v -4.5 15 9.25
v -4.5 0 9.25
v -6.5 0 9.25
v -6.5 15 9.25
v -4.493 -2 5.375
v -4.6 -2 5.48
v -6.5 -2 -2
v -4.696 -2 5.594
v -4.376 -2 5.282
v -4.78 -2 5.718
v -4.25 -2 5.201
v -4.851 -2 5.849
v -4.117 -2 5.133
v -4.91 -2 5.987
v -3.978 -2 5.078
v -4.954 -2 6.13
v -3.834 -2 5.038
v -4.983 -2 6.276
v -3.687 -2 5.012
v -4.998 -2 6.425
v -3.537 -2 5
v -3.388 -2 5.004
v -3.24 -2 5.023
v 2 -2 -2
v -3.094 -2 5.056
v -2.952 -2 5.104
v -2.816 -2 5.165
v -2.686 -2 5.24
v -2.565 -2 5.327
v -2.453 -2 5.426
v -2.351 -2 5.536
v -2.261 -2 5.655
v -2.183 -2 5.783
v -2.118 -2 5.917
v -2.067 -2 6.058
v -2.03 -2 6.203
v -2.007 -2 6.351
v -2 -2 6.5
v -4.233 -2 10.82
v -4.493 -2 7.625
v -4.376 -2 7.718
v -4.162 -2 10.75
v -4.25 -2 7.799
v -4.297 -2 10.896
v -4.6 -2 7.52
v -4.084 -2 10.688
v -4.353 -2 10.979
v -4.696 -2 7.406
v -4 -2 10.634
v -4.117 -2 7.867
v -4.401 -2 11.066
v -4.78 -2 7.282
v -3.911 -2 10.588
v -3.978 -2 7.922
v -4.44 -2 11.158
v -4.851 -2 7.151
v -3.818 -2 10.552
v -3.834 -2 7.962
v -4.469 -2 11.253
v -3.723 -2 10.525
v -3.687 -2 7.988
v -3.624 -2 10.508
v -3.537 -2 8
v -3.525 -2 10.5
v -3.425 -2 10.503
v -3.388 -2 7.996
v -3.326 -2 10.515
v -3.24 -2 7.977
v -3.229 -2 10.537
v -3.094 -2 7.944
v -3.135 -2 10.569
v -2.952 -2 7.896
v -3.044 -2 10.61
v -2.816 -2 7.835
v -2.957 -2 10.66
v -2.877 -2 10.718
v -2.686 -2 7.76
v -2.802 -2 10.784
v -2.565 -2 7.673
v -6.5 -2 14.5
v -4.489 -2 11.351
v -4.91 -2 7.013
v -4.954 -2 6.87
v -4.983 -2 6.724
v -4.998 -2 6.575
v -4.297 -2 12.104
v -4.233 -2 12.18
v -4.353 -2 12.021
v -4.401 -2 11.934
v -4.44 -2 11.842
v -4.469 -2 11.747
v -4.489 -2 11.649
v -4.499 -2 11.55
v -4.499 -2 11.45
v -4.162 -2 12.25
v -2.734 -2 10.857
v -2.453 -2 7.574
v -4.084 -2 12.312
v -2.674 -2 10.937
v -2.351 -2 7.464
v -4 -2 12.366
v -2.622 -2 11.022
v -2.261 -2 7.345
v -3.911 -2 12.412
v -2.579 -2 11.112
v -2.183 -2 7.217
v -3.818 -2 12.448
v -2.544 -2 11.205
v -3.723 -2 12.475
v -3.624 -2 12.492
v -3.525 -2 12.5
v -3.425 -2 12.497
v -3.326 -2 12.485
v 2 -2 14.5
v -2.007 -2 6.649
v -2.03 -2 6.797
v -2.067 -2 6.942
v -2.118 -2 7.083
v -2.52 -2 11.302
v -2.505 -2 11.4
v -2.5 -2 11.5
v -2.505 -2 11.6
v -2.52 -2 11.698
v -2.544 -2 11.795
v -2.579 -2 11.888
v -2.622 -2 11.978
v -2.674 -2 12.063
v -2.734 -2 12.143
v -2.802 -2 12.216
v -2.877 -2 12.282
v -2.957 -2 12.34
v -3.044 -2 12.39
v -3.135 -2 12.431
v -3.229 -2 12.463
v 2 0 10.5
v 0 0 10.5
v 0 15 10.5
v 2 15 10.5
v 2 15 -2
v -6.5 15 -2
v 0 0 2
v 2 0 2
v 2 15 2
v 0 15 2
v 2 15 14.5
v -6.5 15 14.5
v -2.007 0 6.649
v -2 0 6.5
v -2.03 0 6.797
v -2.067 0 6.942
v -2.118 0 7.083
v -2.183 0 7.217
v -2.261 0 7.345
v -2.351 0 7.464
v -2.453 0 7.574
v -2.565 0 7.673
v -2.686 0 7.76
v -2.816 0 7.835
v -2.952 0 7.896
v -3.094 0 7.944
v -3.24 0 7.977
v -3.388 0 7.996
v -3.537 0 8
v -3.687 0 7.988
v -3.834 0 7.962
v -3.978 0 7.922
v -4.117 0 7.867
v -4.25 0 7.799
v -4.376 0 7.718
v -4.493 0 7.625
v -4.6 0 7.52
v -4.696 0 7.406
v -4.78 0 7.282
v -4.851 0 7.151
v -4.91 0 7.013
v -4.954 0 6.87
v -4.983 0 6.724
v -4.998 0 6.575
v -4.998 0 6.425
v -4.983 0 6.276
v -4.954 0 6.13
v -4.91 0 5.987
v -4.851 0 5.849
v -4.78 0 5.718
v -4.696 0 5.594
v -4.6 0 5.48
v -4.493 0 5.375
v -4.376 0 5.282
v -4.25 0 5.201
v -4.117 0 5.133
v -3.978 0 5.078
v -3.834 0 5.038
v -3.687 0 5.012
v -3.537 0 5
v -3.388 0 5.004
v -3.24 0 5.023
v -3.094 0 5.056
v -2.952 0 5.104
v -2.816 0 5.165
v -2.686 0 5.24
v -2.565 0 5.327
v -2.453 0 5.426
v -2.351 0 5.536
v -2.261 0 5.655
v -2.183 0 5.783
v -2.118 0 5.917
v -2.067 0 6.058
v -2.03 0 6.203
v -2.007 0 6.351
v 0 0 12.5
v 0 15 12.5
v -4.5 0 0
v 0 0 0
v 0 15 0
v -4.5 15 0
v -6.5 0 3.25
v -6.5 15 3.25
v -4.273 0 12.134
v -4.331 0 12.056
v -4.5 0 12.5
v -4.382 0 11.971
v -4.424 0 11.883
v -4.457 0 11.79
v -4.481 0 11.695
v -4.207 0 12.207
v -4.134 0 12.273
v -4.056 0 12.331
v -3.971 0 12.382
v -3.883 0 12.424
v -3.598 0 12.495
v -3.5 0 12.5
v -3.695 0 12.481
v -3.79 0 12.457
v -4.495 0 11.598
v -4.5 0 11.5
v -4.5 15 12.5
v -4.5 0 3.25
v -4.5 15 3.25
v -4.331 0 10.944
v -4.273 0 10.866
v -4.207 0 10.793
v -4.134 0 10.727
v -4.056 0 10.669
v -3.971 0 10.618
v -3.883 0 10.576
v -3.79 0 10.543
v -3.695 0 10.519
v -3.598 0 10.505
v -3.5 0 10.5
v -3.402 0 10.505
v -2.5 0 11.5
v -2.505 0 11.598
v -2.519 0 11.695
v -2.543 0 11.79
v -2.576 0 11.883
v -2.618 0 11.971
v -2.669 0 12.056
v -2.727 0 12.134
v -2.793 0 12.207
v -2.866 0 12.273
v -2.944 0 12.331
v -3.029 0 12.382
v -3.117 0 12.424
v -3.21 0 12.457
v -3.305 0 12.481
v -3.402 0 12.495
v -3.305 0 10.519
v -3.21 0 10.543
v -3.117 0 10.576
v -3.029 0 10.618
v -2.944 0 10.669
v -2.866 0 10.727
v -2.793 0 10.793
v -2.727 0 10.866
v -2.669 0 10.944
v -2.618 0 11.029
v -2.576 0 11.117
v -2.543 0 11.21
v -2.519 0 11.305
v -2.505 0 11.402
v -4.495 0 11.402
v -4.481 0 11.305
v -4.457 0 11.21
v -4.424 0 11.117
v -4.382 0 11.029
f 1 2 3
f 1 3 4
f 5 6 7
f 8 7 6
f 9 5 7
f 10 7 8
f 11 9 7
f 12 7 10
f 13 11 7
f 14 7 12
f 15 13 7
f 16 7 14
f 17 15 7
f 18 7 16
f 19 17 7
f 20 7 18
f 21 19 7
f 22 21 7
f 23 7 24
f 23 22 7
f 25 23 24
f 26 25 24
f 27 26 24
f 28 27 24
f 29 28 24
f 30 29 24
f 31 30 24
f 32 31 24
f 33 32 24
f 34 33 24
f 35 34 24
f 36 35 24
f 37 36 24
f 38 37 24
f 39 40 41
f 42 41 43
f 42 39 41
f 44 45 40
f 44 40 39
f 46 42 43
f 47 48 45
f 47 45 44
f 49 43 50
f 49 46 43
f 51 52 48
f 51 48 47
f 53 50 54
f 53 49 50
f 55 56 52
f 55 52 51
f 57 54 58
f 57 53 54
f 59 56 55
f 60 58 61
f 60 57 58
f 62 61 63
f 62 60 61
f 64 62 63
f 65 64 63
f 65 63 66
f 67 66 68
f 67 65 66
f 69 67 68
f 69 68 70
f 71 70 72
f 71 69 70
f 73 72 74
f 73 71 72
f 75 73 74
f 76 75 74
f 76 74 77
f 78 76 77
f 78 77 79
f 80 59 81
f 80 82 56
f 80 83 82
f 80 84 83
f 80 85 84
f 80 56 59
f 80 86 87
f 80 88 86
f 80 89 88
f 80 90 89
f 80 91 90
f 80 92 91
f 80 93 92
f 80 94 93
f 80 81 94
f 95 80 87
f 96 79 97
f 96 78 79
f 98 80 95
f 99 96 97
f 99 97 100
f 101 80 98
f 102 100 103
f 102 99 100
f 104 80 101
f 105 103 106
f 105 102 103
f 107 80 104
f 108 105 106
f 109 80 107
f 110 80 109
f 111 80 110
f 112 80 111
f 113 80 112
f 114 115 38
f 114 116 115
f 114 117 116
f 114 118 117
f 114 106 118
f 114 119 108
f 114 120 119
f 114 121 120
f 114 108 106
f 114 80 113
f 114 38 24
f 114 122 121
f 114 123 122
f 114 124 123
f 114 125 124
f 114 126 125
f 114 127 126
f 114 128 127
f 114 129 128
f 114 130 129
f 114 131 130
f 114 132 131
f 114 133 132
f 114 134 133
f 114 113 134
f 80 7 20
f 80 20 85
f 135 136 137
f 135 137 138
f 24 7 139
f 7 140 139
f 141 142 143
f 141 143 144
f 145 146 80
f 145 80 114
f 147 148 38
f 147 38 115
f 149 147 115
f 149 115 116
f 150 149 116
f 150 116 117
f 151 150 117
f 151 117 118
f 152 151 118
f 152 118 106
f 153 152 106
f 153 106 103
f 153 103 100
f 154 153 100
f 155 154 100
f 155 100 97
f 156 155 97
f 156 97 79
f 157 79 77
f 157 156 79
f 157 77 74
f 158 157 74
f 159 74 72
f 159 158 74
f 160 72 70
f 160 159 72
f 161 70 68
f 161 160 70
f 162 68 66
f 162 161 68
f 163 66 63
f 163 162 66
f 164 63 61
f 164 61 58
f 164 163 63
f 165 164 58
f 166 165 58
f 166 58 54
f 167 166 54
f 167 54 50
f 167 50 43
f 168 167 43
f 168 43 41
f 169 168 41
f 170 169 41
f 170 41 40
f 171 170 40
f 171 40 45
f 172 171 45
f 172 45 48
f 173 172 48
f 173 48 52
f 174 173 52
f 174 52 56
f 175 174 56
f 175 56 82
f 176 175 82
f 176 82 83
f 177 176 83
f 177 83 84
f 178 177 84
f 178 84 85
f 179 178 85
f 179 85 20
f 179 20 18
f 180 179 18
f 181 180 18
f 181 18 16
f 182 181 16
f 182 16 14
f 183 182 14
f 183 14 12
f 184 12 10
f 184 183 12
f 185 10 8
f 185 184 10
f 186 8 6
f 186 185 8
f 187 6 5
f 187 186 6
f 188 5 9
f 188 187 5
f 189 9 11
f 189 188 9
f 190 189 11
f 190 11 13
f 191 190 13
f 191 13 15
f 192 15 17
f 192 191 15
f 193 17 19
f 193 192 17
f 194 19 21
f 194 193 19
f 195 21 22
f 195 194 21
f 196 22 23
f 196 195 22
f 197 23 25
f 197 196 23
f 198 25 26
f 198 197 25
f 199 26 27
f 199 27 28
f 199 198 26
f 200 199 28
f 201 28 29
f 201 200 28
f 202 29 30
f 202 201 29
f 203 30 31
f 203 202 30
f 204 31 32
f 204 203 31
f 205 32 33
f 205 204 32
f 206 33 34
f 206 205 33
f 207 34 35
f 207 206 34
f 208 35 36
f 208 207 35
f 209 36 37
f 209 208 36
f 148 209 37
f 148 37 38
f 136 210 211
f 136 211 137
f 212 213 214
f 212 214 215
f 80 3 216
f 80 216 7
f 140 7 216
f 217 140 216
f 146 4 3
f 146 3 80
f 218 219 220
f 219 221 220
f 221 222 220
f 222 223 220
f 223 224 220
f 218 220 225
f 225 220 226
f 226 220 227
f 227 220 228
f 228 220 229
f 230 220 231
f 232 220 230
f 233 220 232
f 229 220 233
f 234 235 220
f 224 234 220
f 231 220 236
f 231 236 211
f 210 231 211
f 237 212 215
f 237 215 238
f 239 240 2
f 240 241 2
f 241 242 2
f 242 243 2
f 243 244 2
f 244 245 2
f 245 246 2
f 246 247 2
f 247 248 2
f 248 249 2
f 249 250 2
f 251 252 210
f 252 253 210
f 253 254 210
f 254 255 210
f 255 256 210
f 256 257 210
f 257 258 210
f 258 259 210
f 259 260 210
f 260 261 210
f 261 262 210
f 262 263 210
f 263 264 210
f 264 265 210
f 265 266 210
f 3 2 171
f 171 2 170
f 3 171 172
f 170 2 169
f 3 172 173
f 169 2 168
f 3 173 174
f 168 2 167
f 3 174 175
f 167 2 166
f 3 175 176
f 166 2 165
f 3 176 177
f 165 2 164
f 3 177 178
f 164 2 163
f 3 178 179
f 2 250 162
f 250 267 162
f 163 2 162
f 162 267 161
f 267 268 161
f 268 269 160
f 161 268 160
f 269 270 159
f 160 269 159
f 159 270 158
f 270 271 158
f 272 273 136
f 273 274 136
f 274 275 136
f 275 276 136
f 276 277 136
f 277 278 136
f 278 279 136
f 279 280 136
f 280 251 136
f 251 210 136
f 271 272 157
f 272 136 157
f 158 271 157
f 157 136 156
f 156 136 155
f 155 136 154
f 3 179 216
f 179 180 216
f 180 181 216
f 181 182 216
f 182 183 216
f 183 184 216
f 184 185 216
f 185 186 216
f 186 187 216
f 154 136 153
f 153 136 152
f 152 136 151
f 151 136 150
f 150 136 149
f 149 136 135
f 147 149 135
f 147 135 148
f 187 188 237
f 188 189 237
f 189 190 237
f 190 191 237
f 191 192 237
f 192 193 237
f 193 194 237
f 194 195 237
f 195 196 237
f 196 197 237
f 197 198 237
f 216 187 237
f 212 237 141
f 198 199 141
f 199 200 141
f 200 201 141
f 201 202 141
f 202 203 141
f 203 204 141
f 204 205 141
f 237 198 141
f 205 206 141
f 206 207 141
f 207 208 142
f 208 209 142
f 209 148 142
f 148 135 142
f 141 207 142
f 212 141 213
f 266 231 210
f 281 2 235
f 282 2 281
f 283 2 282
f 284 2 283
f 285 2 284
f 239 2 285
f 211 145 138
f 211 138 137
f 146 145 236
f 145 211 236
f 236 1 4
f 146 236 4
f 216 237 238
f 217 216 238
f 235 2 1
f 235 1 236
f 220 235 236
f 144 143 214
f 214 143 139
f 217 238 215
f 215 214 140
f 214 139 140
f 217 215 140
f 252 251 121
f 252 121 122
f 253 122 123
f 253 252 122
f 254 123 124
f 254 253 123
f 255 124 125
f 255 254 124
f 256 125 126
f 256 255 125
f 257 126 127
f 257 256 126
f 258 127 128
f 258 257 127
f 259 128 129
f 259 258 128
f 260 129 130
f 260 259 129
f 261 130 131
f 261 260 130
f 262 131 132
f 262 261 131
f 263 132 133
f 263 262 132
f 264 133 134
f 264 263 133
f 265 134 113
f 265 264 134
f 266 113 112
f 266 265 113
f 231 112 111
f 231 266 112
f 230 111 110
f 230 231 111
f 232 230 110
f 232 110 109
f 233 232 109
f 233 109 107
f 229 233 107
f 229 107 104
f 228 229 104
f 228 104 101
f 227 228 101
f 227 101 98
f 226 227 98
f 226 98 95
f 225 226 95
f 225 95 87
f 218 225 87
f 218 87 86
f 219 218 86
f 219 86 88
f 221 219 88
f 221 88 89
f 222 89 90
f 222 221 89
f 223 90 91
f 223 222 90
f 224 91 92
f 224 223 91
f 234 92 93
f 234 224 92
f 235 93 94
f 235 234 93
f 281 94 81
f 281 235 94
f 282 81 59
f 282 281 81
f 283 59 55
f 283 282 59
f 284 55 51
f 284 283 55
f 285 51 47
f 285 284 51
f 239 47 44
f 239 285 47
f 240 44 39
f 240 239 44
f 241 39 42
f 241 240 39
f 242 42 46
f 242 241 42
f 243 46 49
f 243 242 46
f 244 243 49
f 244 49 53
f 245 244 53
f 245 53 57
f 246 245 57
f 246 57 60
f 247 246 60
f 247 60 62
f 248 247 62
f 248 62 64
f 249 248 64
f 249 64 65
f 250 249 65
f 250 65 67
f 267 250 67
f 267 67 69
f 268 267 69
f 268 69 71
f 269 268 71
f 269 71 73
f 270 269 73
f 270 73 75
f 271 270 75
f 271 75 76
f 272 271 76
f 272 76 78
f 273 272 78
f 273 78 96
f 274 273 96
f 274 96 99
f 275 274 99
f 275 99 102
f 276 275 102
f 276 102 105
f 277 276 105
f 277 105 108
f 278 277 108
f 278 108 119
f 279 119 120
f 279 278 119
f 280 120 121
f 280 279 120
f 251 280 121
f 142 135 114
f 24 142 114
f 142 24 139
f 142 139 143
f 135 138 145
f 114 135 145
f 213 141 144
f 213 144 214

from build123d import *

# Parameters (mm, degrees)
BOSS_EXTRUDE1_DEPTH = 15
SKETCH3_W           = 8.5
SKETCH3_H           = 16.5
SKETCH3_R           = 1
SKETCH3_R_2         = 1.5
BOSS_EXTRUDE2_DEPTH = 2
SKETCH4_W           = 6
SKETCH4_H           = 20
CUT_EXTRUDE1_DEPTH  = 2


with BuildPart() as part:
    # Sketch2 → Boss-Extrude1 (new body)
    with BuildSketch(Plane(origin=(0, 0, 0), x_dir=(1, 0, 0), z_dir=(0, 1, 0))):
        Polygon((0, 0), (-4.5, 0), (-4.5, -12.5), (0, -12.5), (0, -10.5), (2, -10.5), (2, -14.5), (-6.5, -14.5), (-6.5, 2), (2, 2), (2, -2), (0, -2), align=None)
    extrude(amount=BOSS_EXTRUDE1_DEPTH)

    # Sketch3 → Boss-Extrude2 (add)
    with BuildSketch(Plane.XZ):
        with Locations((-2.25, 6.25)):
            Rectangle(SKETCH3_W, SKETCH3_H)
        with Locations((-3.5, 11.5)):
            Circle(SKETCH3_R, mode=Mode.SUBTRACT)
        with Locations((-3.5, 6.5)):
            Circle(SKETCH3_R_2, mode=Mode.SUBTRACT)
    extrude(amount=BOSS_EXTRUDE2_DEPTH)

    # Sketch4 → Cut-Extrude1 (cut)
    with BuildSketch(Plane(origin=(-4.5, 0, 0), x_dir=(0, 0, -1), z_dir=(1, 0, 0))):
        with Locations((-6.25, 10)):
            Rectangle(SKETCH4_W, SKETCH4_H)
    extrude(amount=-CUT_EXTRUDE1_DEPTH, mode=Mode.SUBTRACT)


solid = part.part
